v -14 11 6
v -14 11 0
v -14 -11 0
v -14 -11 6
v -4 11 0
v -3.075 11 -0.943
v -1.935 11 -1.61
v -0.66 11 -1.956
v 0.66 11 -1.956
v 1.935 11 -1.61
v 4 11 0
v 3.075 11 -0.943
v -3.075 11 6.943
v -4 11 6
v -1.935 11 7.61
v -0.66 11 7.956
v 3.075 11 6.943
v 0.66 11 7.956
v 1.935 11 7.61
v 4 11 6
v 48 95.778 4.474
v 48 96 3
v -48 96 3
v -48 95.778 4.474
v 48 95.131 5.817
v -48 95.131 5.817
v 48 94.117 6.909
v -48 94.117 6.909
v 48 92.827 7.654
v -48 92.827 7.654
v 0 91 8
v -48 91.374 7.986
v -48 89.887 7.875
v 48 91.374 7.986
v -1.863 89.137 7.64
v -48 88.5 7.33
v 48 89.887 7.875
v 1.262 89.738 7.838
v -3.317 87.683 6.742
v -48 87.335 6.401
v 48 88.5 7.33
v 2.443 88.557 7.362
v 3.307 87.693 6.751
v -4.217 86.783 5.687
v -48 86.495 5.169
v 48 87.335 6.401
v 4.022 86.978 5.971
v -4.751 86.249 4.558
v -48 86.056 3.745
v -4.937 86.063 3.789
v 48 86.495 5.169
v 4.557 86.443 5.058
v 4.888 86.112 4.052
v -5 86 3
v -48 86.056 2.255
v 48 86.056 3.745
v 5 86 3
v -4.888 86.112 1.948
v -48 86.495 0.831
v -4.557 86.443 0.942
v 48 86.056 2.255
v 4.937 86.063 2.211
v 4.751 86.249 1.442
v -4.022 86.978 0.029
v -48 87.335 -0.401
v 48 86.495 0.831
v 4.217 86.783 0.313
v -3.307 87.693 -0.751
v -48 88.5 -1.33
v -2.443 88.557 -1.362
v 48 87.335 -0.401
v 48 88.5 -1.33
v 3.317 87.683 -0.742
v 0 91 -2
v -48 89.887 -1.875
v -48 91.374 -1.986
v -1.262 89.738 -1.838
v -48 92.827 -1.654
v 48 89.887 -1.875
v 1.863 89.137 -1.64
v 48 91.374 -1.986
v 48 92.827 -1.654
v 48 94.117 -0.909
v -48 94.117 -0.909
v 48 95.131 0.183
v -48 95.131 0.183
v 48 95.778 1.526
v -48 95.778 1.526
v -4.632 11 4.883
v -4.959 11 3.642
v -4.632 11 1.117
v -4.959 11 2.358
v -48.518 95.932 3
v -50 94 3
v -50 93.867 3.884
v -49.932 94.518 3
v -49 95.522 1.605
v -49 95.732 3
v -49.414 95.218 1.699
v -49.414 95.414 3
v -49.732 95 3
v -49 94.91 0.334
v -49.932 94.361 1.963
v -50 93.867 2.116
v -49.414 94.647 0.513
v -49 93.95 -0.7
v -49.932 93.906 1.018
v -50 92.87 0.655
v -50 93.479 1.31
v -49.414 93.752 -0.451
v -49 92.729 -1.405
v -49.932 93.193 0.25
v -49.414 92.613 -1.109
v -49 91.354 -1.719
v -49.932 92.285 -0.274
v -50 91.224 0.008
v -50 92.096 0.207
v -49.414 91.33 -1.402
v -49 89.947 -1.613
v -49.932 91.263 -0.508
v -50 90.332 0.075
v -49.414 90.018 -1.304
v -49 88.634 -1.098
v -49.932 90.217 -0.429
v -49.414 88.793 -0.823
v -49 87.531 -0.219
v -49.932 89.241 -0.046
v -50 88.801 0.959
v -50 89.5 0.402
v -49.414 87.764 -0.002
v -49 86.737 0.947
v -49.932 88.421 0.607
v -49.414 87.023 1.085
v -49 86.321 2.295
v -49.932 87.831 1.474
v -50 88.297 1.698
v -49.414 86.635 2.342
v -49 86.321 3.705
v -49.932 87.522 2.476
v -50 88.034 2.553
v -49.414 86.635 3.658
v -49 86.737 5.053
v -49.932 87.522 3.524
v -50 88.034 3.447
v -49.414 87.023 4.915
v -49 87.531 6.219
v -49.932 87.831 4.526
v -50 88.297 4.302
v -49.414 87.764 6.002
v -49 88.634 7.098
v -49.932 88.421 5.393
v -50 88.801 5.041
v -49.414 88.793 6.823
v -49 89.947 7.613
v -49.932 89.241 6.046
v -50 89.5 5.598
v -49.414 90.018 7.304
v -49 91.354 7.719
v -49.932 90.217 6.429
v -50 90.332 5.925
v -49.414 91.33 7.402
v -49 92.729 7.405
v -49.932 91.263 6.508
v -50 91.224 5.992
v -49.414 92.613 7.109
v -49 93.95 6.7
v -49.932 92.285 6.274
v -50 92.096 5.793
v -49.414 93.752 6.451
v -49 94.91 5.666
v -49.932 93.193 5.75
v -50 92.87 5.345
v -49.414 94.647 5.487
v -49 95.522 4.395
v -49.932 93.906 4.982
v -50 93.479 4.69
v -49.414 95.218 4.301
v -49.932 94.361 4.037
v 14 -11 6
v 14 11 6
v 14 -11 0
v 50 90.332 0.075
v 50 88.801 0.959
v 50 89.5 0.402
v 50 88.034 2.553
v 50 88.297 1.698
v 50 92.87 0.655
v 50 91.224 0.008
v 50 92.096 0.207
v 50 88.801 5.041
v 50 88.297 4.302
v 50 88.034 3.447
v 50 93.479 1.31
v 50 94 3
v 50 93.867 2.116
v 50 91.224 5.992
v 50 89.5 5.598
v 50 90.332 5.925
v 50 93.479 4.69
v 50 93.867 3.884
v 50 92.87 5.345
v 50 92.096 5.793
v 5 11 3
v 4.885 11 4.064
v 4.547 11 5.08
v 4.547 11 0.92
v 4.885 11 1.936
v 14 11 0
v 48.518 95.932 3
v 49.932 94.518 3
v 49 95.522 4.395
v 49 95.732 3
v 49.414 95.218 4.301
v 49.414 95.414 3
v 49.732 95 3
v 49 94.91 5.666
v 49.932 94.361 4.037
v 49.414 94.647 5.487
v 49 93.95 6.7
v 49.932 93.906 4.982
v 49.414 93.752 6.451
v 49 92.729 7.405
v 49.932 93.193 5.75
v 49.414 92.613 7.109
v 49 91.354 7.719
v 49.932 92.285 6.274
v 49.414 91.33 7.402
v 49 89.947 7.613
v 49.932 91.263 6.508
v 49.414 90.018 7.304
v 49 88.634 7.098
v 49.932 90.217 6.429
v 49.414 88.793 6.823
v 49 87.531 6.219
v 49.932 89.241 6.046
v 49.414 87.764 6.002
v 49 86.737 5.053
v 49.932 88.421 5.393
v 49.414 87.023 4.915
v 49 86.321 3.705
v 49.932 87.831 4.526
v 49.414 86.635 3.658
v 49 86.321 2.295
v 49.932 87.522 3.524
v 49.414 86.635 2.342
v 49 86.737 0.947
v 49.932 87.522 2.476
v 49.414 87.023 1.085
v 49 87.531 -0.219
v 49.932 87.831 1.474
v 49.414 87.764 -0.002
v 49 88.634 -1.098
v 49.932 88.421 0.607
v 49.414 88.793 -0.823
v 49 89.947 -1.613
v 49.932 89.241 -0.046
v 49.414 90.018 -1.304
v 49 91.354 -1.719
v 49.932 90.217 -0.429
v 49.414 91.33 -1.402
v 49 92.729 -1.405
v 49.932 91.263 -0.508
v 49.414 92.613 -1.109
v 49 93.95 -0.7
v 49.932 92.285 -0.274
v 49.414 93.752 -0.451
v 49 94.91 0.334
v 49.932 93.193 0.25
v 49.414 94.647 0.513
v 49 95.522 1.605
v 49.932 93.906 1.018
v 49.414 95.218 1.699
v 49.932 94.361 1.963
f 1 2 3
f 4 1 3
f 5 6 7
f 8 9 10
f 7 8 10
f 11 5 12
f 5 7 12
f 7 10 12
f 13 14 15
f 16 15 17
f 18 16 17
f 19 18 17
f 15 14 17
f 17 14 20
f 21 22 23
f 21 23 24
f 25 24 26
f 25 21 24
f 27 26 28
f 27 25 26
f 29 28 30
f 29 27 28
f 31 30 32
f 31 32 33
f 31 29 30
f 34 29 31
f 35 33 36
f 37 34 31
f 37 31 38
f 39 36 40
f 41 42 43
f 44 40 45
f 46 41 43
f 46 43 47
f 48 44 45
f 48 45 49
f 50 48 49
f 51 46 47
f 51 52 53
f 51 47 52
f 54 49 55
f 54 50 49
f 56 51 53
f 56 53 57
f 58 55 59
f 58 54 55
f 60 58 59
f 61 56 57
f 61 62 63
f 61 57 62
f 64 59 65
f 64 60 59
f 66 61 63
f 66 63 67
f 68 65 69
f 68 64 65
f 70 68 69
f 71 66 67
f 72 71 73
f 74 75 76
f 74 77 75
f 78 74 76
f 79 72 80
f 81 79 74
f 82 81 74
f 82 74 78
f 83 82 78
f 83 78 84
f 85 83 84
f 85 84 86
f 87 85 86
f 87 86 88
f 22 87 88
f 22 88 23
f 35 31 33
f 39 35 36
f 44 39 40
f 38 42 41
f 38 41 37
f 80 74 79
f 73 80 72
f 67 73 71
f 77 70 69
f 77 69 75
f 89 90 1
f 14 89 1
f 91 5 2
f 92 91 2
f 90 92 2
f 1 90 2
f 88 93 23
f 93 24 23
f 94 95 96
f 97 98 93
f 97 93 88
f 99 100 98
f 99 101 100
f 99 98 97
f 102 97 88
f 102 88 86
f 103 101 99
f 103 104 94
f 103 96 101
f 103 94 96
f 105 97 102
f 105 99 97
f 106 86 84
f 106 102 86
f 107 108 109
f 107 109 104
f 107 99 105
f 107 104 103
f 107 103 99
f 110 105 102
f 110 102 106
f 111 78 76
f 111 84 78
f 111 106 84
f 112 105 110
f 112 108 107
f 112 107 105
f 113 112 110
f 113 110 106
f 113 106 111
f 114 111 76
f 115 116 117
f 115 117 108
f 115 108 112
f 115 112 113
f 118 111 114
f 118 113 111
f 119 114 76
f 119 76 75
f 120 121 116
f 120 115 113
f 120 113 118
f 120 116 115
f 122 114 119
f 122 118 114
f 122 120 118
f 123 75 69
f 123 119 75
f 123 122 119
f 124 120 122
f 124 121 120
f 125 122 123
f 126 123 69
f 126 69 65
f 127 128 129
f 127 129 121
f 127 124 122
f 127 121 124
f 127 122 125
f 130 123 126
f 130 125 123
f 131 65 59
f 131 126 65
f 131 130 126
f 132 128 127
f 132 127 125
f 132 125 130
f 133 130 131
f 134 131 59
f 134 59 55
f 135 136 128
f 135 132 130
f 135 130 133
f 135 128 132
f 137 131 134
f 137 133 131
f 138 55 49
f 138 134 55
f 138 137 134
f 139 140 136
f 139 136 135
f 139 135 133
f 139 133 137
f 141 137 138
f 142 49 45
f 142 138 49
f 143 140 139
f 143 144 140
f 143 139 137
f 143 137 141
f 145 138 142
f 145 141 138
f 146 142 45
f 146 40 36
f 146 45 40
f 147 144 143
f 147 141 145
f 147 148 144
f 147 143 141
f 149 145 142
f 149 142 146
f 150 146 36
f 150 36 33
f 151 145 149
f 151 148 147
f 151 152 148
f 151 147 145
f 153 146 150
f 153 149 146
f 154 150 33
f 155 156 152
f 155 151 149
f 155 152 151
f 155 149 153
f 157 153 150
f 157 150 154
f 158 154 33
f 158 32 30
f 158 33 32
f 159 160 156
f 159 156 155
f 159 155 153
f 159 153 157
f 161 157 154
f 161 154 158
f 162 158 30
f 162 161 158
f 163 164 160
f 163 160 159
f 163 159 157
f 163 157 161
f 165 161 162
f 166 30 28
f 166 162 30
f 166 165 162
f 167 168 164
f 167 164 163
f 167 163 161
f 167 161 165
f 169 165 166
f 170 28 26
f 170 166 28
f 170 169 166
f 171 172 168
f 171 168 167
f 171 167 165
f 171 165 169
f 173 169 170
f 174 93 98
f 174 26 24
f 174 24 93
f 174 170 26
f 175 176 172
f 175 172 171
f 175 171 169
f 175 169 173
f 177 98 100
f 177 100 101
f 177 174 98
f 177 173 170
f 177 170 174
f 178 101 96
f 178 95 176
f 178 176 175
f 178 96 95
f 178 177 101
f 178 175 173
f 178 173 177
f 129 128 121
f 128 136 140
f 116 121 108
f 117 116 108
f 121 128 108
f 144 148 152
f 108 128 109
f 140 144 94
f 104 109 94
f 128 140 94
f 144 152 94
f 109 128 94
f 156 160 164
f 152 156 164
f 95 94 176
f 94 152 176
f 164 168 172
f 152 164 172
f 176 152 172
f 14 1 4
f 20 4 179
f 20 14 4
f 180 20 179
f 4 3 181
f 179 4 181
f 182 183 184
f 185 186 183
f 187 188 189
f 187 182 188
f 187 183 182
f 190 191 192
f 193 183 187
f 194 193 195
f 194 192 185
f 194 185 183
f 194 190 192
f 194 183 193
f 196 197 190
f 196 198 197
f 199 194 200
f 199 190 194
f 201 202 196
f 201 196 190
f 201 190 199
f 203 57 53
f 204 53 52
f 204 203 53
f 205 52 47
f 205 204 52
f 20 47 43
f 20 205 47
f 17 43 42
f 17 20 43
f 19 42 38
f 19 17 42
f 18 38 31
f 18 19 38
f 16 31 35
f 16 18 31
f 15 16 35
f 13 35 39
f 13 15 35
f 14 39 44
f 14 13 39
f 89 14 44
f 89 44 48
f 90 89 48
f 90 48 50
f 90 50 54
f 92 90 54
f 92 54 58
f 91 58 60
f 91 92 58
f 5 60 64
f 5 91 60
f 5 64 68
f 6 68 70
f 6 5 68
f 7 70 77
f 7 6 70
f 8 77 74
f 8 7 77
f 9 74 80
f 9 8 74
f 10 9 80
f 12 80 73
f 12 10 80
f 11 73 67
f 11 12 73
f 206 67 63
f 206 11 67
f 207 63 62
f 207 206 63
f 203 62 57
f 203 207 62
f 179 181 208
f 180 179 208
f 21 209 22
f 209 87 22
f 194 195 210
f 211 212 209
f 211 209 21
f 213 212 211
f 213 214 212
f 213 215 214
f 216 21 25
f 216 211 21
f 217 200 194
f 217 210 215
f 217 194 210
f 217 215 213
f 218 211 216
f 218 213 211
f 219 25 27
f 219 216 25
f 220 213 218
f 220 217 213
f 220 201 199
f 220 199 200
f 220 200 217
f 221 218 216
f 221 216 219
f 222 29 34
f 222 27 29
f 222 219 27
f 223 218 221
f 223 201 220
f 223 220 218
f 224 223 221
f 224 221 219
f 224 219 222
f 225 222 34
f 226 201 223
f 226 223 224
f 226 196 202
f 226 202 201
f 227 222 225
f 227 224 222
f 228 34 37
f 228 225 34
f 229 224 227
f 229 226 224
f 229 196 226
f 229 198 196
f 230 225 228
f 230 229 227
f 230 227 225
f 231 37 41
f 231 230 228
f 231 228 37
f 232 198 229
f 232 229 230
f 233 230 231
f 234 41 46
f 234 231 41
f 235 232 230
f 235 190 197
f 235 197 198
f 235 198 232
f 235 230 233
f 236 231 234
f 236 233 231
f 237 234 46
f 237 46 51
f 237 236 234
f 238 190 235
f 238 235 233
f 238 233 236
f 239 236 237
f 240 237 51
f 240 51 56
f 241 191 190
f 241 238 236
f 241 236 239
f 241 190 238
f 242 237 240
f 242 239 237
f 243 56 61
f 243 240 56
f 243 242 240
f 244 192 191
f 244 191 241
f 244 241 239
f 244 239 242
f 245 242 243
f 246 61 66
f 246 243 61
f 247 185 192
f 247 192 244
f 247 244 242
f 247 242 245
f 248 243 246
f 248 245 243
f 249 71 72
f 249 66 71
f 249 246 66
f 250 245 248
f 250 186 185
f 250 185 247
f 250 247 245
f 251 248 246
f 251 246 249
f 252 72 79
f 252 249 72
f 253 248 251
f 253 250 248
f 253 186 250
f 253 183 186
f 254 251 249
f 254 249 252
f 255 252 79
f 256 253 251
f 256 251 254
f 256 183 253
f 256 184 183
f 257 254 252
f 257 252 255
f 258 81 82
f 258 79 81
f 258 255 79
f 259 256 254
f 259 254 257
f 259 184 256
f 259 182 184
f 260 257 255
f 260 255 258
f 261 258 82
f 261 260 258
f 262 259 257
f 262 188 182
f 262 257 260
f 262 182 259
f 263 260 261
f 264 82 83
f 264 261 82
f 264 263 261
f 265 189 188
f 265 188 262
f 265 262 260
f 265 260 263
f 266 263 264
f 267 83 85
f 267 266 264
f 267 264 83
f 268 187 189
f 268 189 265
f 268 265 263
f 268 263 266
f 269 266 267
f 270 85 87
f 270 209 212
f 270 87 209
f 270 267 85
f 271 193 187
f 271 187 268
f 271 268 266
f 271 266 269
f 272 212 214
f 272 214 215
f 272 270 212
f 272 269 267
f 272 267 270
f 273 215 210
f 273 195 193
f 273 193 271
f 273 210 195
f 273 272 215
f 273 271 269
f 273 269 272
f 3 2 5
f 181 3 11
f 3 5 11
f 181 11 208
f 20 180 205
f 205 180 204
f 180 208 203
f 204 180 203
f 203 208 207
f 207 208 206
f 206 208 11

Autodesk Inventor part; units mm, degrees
ref_plane "XZ Plane" through (0, 0, 0) normal (0, 1, 0) x (-1, 0, 0)
ref_plane "XY Plane" through (0, 0, 0) normal (0, 0, 1) x (1, 0, 0)
sketch "Skizze1" plane through (0, 0, 0) normal (0, 0, 1) x (1, 0, 0)
  line L0 (-14, -11) -> (14, -11)
  line L1 (14, -11) -> (14, 11)
  line L2 (14, 11) -> (-14, 11)
  line L3 (-14, 11) -> (-14, -11)
  line L4 (-14, -11) -> (14, 11) construction
  line L5 (14, -11) -> (-14, 11) construction
  point P0 (0, 0)
  dimension "d0" = 28
  dimension "d1" = 22
extrude "Extrusion1" add sketch "Skizze1" along normal blind 6
sketch "Skizze2" plane through (-14, 11, 0) normal (0, 1, 0) x (1, 0, 0)
  circle A0 centre (14, -3) radius 5
  line L0 (0, 0) -> (0, -6) projected
  line L1 (28, 0) -> (0, 0) projected
  point P0 (14, 0)
  point P1 (0, -3)
  point P2 (14, 0)
  dimension "d4" = 10
extrude "Extrusion2" add sketch "Skizze2" along normal blind 80
ref_plane "Arbeitsebene1" through (0, 0, 0) normal (1, 0, 0) x (0, 1, 0)
sketch "Skizze3" plane through (0, 0, 0) normal (1, 0, 0) x (0, 1, 0)
  line L0 (91, -2) -> (91, 8) projected
  circle A0 centre (91, 3) radius 5
  point P0 (0, 0)
  dimension "d8" = 10
extrude "Extrusion3" add sketch "Skizze3" along normal mid plane 100
fillet "Rundung1" radius 2 2 edges at (50, 86, 3) (-50, 86, 3)
properties part number "Flutschlüssel"
